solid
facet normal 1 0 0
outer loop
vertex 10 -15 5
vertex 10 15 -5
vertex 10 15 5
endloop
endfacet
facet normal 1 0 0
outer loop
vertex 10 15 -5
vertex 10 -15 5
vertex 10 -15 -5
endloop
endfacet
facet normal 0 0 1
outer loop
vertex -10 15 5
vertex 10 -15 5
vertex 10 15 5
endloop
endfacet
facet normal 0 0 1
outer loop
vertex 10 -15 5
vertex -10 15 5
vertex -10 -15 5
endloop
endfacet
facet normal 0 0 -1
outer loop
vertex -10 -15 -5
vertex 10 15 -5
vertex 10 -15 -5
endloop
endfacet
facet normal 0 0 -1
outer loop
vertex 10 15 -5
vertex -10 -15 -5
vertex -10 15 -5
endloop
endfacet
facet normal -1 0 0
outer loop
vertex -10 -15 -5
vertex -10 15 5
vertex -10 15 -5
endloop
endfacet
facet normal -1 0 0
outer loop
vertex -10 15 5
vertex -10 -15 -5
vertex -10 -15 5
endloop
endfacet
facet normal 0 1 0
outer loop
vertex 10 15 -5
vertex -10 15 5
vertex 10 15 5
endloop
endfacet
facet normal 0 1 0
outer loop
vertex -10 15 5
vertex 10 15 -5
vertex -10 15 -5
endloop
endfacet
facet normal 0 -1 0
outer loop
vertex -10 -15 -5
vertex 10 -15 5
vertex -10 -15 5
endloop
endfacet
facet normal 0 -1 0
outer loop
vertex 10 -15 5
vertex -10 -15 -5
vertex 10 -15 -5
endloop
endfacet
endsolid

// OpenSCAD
// Which one would you like to see?
part = "all"; // [first:External piece,second:Internal piece,all:Both]
/* [Dimensions */
width = 20;
height = 10;
length = 30;

module color1(){
    difference(){
        cube([width,length,height],center=true);
        rotate([45,0,0]) cube([width,length,height],center=true);
    }
}
module color2(){
    intersection(){
        cube([width,length,height],center=true);
        rotate([45,0,0]) cube([width,length,height],center=true);
    }
}
print_part();

module print_part(){
    if(part=="first"){
       color1(); 
    }
    else if(part=="second"){
        color2();
    }
    else if(part=="all"){
        color1(); 
        color2();
    }
} 
